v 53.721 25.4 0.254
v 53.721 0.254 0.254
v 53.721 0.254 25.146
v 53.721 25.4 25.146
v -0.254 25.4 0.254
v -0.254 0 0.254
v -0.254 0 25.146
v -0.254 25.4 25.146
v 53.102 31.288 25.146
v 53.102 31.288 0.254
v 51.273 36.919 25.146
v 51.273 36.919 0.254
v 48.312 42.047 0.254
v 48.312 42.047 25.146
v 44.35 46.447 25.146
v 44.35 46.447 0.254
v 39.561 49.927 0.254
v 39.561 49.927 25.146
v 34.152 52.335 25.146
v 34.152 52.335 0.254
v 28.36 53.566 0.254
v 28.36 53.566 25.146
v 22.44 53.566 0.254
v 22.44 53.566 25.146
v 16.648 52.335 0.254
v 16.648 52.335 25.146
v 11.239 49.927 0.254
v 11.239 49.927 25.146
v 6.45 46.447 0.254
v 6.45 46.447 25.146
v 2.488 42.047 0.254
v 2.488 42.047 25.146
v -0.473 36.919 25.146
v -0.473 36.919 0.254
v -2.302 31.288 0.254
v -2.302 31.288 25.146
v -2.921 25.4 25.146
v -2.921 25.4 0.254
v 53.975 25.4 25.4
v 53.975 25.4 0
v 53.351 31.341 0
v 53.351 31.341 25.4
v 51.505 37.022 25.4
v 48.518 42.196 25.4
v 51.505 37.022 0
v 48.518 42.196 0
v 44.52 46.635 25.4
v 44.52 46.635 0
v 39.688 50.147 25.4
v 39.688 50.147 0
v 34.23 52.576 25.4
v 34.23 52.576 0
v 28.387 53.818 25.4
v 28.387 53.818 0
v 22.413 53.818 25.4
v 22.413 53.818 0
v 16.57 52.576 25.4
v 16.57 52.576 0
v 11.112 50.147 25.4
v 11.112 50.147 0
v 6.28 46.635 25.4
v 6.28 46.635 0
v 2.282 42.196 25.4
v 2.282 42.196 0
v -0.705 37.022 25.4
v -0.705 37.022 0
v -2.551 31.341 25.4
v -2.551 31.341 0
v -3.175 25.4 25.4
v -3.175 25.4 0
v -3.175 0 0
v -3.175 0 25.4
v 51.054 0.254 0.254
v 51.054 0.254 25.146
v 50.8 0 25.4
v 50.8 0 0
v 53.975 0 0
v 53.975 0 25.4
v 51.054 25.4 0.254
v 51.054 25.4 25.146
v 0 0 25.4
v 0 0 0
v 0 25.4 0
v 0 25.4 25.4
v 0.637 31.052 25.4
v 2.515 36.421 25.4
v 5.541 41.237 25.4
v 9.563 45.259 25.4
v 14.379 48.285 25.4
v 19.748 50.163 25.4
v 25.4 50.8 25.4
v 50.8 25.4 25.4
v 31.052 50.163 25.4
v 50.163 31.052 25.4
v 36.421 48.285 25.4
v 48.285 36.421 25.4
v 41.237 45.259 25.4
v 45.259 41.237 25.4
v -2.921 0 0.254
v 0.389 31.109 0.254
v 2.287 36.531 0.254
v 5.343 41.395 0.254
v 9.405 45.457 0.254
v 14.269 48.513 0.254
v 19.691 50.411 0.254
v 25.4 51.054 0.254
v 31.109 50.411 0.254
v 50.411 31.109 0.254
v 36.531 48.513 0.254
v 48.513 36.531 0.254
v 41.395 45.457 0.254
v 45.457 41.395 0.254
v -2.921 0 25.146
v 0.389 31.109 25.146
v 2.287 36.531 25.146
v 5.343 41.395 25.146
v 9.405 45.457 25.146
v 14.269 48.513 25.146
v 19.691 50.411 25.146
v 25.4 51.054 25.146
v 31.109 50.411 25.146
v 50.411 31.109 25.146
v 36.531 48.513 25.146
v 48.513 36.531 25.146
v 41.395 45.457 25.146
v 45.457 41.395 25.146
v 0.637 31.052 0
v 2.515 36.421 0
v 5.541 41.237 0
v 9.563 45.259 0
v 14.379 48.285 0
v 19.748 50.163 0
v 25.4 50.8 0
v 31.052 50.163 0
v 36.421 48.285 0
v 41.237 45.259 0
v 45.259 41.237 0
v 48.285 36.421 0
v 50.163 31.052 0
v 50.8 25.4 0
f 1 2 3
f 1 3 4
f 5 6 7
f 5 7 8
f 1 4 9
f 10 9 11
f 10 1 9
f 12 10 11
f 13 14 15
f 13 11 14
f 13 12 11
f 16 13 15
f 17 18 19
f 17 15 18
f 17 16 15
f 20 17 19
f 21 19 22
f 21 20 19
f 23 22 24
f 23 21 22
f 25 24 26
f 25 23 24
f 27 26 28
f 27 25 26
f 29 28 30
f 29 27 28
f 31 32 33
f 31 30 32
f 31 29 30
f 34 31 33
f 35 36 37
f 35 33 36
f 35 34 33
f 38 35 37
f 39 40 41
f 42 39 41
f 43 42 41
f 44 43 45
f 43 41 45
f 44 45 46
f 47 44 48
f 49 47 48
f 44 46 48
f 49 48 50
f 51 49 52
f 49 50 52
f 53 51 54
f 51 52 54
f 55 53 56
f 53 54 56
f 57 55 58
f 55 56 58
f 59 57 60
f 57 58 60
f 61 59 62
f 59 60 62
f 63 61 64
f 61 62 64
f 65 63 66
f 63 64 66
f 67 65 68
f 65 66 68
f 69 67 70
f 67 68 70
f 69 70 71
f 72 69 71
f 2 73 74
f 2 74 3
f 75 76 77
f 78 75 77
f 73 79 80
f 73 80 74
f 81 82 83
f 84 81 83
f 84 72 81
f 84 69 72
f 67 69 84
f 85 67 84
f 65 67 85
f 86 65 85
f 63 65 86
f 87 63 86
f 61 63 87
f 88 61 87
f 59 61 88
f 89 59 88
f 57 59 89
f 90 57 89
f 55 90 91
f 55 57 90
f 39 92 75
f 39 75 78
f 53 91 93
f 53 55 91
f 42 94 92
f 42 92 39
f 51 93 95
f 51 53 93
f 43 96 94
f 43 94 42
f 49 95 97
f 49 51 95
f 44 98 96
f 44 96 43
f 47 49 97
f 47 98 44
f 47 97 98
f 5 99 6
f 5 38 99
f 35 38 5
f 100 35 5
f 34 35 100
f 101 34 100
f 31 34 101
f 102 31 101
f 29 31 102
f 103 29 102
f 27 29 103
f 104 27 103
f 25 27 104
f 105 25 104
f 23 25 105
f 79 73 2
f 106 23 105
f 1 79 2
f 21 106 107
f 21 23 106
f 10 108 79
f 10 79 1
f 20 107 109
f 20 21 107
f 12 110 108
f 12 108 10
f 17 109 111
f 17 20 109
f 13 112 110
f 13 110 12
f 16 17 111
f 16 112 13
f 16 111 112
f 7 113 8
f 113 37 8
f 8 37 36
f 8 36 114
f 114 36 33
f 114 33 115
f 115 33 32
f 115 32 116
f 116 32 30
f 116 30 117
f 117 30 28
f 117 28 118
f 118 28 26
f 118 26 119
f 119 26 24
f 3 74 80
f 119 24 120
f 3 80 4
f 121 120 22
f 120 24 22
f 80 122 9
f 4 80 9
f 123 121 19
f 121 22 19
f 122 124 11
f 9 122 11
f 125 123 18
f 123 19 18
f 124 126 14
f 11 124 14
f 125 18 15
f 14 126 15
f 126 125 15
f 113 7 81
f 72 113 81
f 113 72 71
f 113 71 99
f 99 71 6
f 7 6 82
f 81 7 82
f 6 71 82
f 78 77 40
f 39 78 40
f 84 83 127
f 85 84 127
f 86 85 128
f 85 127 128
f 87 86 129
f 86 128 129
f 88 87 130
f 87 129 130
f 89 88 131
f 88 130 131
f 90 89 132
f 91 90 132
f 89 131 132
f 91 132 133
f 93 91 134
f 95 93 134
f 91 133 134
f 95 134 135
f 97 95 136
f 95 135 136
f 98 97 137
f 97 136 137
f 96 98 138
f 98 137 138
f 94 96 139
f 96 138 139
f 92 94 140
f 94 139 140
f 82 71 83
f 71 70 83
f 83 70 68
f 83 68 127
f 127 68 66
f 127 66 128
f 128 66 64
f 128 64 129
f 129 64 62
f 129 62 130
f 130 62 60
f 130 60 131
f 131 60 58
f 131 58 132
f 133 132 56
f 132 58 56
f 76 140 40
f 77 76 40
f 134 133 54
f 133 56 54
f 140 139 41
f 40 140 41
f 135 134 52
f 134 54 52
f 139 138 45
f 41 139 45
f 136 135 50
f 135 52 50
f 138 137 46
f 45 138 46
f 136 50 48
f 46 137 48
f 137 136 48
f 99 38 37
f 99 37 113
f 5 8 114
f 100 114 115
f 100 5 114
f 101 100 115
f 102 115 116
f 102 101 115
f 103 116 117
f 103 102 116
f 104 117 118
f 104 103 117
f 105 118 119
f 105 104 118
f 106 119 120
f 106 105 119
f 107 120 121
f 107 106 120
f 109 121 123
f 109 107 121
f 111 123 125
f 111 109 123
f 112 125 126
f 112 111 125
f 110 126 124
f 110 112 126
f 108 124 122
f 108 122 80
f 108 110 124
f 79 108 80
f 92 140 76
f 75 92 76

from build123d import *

# Parameters (mm, degrees)
F1_DEPTH = 25.4
F2_T     = -0.254


with BuildPart() as f1:
    # F0 (on Top) → F1 (new body)
    with BuildSketch(Plane.XY):
        with BuildLine():
            Line((-3.175, 0), (0, 0))
            Line((0, 0), (0, 25.4))
            ThreePointArc((0, 25.4), (25.4, 50.8), (50.8, 25.4))
            Line((50.8, 25.4), (50.8, 0))
            Line((50.8, 0), (53.975, 0))
            Line((53.975, 0), (53.975, 25.4))
            ThreePointArc((53.975, 25.4), (25.4, 53.975), (-3.175, 25.4))
            Line((-3.175, 25.4), (-3.175, 0))
        make_face()
    extrude(amount=F1_DEPTH)

    # F2
    f2_openings = [f1.faces().sort_by_distance(p)[0] for p in [
        (-1.5875, 0, 12.7),
    ]]
    offset(amount=F2_T, openings=f2_openings)


solid = f1.part
